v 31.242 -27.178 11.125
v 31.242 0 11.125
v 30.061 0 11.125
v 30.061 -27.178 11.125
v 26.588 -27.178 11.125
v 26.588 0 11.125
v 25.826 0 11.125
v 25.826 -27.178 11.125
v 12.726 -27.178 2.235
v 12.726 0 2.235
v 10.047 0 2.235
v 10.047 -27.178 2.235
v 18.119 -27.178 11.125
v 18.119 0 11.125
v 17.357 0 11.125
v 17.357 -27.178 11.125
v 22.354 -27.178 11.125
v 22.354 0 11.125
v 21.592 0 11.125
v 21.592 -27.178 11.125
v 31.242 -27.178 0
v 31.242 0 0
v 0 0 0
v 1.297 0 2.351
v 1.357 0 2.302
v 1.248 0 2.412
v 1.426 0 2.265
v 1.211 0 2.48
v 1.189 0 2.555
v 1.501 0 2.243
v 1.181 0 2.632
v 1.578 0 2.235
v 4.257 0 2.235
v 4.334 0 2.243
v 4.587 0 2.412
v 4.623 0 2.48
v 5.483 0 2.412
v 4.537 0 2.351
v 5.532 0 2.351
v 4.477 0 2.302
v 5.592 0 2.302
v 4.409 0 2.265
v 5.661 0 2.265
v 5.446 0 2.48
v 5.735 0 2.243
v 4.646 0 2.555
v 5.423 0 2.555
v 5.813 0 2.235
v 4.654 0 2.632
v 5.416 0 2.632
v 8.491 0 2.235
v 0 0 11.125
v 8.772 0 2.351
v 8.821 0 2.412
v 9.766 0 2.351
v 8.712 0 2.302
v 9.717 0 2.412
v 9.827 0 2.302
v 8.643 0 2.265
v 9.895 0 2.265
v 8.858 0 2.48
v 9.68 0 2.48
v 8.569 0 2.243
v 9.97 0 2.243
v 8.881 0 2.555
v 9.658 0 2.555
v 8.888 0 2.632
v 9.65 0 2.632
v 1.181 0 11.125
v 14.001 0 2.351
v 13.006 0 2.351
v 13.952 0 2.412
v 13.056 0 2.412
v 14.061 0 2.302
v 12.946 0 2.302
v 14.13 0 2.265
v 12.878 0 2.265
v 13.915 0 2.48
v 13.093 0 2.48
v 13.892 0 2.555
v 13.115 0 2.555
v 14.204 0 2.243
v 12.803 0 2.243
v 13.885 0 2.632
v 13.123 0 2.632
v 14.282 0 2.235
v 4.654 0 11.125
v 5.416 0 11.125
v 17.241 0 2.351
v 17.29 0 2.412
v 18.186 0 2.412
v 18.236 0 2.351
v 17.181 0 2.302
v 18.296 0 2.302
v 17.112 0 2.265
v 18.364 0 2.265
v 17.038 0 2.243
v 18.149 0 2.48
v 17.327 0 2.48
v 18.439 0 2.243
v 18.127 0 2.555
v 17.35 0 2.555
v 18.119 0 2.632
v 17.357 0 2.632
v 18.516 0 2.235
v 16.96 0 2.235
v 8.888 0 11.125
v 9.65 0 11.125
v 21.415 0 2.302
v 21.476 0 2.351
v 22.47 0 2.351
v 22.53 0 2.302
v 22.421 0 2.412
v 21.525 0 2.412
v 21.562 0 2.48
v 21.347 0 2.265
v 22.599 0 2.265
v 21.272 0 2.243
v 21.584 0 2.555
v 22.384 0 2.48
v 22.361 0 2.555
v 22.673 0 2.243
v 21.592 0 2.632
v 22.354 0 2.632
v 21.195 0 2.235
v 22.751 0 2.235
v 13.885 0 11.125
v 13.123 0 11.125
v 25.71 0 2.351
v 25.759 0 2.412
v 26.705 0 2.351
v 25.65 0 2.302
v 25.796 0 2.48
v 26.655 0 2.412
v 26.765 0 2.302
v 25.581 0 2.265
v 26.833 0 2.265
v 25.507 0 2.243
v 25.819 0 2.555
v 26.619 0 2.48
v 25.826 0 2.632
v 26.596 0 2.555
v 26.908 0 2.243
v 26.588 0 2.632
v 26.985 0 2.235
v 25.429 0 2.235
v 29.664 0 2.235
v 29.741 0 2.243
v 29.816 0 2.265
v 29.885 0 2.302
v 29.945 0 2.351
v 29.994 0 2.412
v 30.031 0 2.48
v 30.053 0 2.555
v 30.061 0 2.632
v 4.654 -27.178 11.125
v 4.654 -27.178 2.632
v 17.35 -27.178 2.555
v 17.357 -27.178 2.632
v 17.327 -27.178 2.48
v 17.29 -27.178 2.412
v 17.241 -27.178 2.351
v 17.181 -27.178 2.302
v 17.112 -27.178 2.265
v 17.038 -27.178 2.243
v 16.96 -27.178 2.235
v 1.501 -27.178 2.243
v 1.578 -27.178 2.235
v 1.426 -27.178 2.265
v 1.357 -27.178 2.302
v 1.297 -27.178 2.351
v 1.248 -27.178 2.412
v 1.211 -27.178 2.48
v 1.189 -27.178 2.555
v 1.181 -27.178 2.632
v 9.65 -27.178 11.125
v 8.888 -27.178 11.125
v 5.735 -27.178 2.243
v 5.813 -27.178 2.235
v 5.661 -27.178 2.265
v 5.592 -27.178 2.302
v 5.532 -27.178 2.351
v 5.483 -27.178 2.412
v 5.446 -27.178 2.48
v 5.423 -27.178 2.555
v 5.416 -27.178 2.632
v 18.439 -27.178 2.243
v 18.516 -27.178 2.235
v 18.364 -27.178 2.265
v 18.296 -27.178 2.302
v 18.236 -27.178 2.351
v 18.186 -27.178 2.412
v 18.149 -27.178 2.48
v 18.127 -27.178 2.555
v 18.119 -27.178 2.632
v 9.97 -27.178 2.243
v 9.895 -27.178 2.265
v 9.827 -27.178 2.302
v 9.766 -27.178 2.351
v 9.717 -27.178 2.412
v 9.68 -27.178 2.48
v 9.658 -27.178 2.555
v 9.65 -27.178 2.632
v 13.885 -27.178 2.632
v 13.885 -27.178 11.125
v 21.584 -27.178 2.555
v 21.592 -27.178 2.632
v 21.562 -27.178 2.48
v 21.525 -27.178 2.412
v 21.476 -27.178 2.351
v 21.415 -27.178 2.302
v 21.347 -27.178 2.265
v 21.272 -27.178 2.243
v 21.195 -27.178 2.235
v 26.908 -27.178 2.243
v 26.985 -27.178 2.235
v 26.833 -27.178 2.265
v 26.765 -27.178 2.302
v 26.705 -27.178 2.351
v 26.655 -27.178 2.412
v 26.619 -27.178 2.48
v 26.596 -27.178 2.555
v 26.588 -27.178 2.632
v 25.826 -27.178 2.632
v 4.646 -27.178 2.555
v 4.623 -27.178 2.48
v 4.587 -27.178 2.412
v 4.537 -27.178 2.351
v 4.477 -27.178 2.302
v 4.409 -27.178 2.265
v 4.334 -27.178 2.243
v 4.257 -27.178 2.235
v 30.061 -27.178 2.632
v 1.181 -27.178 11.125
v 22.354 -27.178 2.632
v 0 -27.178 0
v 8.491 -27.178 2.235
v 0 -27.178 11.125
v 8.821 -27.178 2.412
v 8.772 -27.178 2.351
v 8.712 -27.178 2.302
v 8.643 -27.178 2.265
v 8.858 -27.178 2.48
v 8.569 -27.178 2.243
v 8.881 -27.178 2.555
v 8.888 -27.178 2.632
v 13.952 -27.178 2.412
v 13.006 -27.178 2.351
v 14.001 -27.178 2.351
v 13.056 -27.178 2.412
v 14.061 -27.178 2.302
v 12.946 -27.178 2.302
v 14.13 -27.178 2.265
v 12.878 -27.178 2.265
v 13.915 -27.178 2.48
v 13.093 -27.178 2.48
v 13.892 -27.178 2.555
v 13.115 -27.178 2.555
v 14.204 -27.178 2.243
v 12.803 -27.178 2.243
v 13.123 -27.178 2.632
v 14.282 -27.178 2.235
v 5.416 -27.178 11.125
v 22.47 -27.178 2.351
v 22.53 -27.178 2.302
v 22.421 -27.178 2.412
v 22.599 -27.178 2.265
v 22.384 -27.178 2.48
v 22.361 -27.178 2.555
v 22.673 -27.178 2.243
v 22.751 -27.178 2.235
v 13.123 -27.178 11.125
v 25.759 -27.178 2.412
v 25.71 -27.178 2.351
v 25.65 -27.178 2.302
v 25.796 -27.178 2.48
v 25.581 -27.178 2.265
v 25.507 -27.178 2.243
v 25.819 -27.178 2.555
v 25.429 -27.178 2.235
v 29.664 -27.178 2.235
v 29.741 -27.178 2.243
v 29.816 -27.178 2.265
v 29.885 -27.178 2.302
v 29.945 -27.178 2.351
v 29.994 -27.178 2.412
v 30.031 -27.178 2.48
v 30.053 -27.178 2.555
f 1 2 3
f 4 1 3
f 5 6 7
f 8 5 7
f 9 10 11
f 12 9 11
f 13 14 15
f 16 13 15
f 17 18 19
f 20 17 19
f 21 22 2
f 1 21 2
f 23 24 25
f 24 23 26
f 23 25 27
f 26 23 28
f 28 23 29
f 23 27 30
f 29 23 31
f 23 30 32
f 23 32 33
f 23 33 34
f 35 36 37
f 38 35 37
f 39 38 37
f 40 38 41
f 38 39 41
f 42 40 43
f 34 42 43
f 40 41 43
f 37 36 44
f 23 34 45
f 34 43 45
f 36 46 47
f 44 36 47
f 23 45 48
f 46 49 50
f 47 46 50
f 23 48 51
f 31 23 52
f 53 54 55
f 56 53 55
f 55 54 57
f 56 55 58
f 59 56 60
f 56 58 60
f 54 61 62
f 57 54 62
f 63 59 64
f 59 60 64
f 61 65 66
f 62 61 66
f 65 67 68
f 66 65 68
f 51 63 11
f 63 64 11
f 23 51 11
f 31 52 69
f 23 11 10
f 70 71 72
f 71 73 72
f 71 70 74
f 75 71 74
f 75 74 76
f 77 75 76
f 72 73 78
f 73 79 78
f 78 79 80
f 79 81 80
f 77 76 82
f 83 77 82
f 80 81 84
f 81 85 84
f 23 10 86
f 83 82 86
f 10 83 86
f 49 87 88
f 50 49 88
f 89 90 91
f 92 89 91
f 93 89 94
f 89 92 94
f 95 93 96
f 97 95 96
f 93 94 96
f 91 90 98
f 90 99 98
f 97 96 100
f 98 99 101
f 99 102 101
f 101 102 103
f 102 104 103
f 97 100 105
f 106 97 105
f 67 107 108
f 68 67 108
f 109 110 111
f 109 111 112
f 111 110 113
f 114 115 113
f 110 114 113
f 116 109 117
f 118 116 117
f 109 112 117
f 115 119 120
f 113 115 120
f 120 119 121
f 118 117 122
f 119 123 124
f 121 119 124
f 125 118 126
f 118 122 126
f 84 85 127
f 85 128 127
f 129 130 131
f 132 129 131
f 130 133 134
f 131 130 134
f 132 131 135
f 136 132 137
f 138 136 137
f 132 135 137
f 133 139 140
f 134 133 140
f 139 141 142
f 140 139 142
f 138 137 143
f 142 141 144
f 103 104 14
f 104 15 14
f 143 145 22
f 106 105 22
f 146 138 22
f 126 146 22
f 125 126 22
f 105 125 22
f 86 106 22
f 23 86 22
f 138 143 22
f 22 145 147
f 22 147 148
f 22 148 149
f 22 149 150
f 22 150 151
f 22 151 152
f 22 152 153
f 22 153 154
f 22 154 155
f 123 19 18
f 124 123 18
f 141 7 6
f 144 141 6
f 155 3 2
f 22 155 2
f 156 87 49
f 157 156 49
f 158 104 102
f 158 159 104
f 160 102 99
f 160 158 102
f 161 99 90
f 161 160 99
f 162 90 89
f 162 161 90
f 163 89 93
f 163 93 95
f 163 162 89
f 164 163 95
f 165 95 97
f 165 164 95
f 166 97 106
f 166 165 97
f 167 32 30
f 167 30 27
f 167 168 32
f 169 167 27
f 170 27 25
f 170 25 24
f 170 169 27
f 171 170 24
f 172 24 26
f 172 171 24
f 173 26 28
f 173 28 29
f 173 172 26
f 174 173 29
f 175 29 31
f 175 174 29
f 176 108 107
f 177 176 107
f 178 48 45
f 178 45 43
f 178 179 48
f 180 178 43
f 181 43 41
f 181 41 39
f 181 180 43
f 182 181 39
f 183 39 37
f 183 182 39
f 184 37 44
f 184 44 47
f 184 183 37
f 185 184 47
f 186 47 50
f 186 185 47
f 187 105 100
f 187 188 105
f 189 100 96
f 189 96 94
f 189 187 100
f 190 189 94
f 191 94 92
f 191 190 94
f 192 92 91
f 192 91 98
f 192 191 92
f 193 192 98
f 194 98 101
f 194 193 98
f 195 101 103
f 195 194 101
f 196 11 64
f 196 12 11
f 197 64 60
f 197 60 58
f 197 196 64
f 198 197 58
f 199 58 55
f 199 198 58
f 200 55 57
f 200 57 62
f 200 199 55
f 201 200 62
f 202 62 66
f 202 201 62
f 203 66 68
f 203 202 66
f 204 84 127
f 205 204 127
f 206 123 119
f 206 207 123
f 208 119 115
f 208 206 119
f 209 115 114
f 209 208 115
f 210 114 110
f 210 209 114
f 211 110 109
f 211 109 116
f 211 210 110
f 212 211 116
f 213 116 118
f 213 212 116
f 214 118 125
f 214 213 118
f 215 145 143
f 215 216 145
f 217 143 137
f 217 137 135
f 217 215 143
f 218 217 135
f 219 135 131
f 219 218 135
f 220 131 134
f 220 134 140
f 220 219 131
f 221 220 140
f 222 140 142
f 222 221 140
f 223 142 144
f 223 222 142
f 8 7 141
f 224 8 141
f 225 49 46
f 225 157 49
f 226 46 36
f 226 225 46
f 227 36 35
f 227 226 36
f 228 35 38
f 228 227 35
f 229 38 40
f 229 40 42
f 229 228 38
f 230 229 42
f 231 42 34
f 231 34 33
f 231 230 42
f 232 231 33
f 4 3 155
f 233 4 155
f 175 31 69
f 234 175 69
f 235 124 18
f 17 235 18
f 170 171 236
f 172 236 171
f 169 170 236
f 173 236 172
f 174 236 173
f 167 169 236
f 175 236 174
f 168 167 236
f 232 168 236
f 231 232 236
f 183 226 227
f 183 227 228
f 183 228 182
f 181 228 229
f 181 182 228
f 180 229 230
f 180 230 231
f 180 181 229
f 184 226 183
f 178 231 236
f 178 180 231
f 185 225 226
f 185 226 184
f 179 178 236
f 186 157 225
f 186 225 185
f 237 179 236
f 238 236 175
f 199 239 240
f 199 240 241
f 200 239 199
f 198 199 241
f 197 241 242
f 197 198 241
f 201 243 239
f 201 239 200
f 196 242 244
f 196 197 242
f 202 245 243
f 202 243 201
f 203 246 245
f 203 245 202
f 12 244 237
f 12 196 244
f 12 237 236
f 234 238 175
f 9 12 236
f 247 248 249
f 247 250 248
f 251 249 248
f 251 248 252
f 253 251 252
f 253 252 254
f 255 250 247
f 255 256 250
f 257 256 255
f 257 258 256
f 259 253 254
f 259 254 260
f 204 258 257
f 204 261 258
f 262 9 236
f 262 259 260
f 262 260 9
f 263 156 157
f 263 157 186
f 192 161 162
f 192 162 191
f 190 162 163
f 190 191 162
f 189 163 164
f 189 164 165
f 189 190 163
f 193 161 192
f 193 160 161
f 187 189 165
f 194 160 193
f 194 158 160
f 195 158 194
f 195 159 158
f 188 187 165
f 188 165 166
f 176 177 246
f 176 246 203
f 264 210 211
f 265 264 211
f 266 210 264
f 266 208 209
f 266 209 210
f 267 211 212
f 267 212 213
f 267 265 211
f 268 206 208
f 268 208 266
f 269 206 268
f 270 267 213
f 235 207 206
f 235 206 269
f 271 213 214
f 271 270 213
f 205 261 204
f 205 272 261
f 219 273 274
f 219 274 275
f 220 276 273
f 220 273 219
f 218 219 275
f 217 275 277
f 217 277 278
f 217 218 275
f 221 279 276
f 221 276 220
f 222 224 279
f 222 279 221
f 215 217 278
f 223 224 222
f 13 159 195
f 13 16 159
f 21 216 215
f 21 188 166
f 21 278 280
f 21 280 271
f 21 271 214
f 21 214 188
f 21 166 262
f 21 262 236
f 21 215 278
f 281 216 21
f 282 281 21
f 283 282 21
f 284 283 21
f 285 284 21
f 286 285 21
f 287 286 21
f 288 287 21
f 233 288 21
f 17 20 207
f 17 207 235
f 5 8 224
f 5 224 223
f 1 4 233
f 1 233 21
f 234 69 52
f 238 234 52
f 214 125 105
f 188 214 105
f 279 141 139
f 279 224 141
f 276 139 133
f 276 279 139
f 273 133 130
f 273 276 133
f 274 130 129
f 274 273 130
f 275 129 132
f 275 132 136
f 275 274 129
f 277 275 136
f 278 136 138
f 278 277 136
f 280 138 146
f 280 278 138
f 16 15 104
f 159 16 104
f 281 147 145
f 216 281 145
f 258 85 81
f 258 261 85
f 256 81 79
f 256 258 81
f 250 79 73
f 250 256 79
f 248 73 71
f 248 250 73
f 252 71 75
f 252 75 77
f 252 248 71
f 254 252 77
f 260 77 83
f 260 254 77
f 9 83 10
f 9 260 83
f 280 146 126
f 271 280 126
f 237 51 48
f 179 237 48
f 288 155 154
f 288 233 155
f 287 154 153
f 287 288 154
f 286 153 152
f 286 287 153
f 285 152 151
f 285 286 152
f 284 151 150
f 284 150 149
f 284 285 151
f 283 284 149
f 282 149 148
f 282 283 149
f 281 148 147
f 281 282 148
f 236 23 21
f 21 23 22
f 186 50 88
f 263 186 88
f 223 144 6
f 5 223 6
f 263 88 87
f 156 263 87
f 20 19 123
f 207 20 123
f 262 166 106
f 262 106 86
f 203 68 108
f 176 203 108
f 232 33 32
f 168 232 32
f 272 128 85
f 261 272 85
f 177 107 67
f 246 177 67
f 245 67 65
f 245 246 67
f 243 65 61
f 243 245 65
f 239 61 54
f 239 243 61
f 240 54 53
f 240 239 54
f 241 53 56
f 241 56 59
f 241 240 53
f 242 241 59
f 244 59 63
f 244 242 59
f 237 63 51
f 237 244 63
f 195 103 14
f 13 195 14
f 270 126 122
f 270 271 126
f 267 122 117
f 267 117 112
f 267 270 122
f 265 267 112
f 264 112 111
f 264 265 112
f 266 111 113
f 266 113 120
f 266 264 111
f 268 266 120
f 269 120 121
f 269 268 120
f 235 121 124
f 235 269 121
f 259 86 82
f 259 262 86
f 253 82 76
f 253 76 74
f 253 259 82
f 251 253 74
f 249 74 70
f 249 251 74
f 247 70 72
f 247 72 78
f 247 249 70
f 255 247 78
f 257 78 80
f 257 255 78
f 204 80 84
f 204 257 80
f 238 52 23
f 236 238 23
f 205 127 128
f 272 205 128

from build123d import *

# Parameters (mm, degrees)
F1_DEPTH = 27.178
F2_R     = 0.396875


with BuildPart() as f1:
    # F0 (on Front) → F1 (new body)
    with BuildSketch(Plane.XZ):
        Polygon((0, 0), (31.242, 0), (31.242, 11.1252), (30.0609, 11.1252), (30.0609, 2.2352), (26.588357, 2.2352), (26.588357, 11.1252), (25.826357, 11.1252), (25.826357, 2.2352), (22.353814, 2.2352), (22.353814, 11.1252), (21.591814, 11.1252), (21.591814, 2.2352), (18.119271, 2.2352), (18.119271, 11.1252), (17.357271, 11.1252), (17.357271, 2.2352), (13.884729, 2.2352), (13.884729, 11.1252), (13.122729, 11.1252), (13.122729, 2.2352), (9.650186, 2.2352), (9.650186, 11.1252), (8.888186, 11.1252), (8.888186, 2.2352), (5.415643, 2.2352), (5.415643, 11.1252), (4.653643, 11.1252), (4.653643, 2.2352), (1.1811, 2.2352), (1.1811, 11.1252), (0, 11.1252), align=None)
    extrude(amount=F1_DEPTH)

    # F2
    f2_edges = [f1.edges().sort_by_distance(p)[0] for p in [
        (1.1811, -13.589, 2.2352),
        (4.653643, -13.589, 2.2352),
        (5.415643, -13.589, 2.2352),
        (8.888186, -13.589, 2.2352),
        (9.650186, -13.589, 2.2352),
        (13.122729, -13.589, 2.2352),
        (13.884729, -13.589, 2.2352),
        (17.357271, -13.589, 2.2352),
        (18.119271, -13.589, 2.2352),
        (21.591814, -13.589, 2.2352),
        (22.353814, -13.589, 2.2352),
        (25.826357, -13.589, 2.2352),
        (26.588357, -13.589, 2.2352),
        (30.0609, -13.589, 2.2352),
    ]]
    fillet(f2_edges, radius=F2_R)


solid = f1.part
